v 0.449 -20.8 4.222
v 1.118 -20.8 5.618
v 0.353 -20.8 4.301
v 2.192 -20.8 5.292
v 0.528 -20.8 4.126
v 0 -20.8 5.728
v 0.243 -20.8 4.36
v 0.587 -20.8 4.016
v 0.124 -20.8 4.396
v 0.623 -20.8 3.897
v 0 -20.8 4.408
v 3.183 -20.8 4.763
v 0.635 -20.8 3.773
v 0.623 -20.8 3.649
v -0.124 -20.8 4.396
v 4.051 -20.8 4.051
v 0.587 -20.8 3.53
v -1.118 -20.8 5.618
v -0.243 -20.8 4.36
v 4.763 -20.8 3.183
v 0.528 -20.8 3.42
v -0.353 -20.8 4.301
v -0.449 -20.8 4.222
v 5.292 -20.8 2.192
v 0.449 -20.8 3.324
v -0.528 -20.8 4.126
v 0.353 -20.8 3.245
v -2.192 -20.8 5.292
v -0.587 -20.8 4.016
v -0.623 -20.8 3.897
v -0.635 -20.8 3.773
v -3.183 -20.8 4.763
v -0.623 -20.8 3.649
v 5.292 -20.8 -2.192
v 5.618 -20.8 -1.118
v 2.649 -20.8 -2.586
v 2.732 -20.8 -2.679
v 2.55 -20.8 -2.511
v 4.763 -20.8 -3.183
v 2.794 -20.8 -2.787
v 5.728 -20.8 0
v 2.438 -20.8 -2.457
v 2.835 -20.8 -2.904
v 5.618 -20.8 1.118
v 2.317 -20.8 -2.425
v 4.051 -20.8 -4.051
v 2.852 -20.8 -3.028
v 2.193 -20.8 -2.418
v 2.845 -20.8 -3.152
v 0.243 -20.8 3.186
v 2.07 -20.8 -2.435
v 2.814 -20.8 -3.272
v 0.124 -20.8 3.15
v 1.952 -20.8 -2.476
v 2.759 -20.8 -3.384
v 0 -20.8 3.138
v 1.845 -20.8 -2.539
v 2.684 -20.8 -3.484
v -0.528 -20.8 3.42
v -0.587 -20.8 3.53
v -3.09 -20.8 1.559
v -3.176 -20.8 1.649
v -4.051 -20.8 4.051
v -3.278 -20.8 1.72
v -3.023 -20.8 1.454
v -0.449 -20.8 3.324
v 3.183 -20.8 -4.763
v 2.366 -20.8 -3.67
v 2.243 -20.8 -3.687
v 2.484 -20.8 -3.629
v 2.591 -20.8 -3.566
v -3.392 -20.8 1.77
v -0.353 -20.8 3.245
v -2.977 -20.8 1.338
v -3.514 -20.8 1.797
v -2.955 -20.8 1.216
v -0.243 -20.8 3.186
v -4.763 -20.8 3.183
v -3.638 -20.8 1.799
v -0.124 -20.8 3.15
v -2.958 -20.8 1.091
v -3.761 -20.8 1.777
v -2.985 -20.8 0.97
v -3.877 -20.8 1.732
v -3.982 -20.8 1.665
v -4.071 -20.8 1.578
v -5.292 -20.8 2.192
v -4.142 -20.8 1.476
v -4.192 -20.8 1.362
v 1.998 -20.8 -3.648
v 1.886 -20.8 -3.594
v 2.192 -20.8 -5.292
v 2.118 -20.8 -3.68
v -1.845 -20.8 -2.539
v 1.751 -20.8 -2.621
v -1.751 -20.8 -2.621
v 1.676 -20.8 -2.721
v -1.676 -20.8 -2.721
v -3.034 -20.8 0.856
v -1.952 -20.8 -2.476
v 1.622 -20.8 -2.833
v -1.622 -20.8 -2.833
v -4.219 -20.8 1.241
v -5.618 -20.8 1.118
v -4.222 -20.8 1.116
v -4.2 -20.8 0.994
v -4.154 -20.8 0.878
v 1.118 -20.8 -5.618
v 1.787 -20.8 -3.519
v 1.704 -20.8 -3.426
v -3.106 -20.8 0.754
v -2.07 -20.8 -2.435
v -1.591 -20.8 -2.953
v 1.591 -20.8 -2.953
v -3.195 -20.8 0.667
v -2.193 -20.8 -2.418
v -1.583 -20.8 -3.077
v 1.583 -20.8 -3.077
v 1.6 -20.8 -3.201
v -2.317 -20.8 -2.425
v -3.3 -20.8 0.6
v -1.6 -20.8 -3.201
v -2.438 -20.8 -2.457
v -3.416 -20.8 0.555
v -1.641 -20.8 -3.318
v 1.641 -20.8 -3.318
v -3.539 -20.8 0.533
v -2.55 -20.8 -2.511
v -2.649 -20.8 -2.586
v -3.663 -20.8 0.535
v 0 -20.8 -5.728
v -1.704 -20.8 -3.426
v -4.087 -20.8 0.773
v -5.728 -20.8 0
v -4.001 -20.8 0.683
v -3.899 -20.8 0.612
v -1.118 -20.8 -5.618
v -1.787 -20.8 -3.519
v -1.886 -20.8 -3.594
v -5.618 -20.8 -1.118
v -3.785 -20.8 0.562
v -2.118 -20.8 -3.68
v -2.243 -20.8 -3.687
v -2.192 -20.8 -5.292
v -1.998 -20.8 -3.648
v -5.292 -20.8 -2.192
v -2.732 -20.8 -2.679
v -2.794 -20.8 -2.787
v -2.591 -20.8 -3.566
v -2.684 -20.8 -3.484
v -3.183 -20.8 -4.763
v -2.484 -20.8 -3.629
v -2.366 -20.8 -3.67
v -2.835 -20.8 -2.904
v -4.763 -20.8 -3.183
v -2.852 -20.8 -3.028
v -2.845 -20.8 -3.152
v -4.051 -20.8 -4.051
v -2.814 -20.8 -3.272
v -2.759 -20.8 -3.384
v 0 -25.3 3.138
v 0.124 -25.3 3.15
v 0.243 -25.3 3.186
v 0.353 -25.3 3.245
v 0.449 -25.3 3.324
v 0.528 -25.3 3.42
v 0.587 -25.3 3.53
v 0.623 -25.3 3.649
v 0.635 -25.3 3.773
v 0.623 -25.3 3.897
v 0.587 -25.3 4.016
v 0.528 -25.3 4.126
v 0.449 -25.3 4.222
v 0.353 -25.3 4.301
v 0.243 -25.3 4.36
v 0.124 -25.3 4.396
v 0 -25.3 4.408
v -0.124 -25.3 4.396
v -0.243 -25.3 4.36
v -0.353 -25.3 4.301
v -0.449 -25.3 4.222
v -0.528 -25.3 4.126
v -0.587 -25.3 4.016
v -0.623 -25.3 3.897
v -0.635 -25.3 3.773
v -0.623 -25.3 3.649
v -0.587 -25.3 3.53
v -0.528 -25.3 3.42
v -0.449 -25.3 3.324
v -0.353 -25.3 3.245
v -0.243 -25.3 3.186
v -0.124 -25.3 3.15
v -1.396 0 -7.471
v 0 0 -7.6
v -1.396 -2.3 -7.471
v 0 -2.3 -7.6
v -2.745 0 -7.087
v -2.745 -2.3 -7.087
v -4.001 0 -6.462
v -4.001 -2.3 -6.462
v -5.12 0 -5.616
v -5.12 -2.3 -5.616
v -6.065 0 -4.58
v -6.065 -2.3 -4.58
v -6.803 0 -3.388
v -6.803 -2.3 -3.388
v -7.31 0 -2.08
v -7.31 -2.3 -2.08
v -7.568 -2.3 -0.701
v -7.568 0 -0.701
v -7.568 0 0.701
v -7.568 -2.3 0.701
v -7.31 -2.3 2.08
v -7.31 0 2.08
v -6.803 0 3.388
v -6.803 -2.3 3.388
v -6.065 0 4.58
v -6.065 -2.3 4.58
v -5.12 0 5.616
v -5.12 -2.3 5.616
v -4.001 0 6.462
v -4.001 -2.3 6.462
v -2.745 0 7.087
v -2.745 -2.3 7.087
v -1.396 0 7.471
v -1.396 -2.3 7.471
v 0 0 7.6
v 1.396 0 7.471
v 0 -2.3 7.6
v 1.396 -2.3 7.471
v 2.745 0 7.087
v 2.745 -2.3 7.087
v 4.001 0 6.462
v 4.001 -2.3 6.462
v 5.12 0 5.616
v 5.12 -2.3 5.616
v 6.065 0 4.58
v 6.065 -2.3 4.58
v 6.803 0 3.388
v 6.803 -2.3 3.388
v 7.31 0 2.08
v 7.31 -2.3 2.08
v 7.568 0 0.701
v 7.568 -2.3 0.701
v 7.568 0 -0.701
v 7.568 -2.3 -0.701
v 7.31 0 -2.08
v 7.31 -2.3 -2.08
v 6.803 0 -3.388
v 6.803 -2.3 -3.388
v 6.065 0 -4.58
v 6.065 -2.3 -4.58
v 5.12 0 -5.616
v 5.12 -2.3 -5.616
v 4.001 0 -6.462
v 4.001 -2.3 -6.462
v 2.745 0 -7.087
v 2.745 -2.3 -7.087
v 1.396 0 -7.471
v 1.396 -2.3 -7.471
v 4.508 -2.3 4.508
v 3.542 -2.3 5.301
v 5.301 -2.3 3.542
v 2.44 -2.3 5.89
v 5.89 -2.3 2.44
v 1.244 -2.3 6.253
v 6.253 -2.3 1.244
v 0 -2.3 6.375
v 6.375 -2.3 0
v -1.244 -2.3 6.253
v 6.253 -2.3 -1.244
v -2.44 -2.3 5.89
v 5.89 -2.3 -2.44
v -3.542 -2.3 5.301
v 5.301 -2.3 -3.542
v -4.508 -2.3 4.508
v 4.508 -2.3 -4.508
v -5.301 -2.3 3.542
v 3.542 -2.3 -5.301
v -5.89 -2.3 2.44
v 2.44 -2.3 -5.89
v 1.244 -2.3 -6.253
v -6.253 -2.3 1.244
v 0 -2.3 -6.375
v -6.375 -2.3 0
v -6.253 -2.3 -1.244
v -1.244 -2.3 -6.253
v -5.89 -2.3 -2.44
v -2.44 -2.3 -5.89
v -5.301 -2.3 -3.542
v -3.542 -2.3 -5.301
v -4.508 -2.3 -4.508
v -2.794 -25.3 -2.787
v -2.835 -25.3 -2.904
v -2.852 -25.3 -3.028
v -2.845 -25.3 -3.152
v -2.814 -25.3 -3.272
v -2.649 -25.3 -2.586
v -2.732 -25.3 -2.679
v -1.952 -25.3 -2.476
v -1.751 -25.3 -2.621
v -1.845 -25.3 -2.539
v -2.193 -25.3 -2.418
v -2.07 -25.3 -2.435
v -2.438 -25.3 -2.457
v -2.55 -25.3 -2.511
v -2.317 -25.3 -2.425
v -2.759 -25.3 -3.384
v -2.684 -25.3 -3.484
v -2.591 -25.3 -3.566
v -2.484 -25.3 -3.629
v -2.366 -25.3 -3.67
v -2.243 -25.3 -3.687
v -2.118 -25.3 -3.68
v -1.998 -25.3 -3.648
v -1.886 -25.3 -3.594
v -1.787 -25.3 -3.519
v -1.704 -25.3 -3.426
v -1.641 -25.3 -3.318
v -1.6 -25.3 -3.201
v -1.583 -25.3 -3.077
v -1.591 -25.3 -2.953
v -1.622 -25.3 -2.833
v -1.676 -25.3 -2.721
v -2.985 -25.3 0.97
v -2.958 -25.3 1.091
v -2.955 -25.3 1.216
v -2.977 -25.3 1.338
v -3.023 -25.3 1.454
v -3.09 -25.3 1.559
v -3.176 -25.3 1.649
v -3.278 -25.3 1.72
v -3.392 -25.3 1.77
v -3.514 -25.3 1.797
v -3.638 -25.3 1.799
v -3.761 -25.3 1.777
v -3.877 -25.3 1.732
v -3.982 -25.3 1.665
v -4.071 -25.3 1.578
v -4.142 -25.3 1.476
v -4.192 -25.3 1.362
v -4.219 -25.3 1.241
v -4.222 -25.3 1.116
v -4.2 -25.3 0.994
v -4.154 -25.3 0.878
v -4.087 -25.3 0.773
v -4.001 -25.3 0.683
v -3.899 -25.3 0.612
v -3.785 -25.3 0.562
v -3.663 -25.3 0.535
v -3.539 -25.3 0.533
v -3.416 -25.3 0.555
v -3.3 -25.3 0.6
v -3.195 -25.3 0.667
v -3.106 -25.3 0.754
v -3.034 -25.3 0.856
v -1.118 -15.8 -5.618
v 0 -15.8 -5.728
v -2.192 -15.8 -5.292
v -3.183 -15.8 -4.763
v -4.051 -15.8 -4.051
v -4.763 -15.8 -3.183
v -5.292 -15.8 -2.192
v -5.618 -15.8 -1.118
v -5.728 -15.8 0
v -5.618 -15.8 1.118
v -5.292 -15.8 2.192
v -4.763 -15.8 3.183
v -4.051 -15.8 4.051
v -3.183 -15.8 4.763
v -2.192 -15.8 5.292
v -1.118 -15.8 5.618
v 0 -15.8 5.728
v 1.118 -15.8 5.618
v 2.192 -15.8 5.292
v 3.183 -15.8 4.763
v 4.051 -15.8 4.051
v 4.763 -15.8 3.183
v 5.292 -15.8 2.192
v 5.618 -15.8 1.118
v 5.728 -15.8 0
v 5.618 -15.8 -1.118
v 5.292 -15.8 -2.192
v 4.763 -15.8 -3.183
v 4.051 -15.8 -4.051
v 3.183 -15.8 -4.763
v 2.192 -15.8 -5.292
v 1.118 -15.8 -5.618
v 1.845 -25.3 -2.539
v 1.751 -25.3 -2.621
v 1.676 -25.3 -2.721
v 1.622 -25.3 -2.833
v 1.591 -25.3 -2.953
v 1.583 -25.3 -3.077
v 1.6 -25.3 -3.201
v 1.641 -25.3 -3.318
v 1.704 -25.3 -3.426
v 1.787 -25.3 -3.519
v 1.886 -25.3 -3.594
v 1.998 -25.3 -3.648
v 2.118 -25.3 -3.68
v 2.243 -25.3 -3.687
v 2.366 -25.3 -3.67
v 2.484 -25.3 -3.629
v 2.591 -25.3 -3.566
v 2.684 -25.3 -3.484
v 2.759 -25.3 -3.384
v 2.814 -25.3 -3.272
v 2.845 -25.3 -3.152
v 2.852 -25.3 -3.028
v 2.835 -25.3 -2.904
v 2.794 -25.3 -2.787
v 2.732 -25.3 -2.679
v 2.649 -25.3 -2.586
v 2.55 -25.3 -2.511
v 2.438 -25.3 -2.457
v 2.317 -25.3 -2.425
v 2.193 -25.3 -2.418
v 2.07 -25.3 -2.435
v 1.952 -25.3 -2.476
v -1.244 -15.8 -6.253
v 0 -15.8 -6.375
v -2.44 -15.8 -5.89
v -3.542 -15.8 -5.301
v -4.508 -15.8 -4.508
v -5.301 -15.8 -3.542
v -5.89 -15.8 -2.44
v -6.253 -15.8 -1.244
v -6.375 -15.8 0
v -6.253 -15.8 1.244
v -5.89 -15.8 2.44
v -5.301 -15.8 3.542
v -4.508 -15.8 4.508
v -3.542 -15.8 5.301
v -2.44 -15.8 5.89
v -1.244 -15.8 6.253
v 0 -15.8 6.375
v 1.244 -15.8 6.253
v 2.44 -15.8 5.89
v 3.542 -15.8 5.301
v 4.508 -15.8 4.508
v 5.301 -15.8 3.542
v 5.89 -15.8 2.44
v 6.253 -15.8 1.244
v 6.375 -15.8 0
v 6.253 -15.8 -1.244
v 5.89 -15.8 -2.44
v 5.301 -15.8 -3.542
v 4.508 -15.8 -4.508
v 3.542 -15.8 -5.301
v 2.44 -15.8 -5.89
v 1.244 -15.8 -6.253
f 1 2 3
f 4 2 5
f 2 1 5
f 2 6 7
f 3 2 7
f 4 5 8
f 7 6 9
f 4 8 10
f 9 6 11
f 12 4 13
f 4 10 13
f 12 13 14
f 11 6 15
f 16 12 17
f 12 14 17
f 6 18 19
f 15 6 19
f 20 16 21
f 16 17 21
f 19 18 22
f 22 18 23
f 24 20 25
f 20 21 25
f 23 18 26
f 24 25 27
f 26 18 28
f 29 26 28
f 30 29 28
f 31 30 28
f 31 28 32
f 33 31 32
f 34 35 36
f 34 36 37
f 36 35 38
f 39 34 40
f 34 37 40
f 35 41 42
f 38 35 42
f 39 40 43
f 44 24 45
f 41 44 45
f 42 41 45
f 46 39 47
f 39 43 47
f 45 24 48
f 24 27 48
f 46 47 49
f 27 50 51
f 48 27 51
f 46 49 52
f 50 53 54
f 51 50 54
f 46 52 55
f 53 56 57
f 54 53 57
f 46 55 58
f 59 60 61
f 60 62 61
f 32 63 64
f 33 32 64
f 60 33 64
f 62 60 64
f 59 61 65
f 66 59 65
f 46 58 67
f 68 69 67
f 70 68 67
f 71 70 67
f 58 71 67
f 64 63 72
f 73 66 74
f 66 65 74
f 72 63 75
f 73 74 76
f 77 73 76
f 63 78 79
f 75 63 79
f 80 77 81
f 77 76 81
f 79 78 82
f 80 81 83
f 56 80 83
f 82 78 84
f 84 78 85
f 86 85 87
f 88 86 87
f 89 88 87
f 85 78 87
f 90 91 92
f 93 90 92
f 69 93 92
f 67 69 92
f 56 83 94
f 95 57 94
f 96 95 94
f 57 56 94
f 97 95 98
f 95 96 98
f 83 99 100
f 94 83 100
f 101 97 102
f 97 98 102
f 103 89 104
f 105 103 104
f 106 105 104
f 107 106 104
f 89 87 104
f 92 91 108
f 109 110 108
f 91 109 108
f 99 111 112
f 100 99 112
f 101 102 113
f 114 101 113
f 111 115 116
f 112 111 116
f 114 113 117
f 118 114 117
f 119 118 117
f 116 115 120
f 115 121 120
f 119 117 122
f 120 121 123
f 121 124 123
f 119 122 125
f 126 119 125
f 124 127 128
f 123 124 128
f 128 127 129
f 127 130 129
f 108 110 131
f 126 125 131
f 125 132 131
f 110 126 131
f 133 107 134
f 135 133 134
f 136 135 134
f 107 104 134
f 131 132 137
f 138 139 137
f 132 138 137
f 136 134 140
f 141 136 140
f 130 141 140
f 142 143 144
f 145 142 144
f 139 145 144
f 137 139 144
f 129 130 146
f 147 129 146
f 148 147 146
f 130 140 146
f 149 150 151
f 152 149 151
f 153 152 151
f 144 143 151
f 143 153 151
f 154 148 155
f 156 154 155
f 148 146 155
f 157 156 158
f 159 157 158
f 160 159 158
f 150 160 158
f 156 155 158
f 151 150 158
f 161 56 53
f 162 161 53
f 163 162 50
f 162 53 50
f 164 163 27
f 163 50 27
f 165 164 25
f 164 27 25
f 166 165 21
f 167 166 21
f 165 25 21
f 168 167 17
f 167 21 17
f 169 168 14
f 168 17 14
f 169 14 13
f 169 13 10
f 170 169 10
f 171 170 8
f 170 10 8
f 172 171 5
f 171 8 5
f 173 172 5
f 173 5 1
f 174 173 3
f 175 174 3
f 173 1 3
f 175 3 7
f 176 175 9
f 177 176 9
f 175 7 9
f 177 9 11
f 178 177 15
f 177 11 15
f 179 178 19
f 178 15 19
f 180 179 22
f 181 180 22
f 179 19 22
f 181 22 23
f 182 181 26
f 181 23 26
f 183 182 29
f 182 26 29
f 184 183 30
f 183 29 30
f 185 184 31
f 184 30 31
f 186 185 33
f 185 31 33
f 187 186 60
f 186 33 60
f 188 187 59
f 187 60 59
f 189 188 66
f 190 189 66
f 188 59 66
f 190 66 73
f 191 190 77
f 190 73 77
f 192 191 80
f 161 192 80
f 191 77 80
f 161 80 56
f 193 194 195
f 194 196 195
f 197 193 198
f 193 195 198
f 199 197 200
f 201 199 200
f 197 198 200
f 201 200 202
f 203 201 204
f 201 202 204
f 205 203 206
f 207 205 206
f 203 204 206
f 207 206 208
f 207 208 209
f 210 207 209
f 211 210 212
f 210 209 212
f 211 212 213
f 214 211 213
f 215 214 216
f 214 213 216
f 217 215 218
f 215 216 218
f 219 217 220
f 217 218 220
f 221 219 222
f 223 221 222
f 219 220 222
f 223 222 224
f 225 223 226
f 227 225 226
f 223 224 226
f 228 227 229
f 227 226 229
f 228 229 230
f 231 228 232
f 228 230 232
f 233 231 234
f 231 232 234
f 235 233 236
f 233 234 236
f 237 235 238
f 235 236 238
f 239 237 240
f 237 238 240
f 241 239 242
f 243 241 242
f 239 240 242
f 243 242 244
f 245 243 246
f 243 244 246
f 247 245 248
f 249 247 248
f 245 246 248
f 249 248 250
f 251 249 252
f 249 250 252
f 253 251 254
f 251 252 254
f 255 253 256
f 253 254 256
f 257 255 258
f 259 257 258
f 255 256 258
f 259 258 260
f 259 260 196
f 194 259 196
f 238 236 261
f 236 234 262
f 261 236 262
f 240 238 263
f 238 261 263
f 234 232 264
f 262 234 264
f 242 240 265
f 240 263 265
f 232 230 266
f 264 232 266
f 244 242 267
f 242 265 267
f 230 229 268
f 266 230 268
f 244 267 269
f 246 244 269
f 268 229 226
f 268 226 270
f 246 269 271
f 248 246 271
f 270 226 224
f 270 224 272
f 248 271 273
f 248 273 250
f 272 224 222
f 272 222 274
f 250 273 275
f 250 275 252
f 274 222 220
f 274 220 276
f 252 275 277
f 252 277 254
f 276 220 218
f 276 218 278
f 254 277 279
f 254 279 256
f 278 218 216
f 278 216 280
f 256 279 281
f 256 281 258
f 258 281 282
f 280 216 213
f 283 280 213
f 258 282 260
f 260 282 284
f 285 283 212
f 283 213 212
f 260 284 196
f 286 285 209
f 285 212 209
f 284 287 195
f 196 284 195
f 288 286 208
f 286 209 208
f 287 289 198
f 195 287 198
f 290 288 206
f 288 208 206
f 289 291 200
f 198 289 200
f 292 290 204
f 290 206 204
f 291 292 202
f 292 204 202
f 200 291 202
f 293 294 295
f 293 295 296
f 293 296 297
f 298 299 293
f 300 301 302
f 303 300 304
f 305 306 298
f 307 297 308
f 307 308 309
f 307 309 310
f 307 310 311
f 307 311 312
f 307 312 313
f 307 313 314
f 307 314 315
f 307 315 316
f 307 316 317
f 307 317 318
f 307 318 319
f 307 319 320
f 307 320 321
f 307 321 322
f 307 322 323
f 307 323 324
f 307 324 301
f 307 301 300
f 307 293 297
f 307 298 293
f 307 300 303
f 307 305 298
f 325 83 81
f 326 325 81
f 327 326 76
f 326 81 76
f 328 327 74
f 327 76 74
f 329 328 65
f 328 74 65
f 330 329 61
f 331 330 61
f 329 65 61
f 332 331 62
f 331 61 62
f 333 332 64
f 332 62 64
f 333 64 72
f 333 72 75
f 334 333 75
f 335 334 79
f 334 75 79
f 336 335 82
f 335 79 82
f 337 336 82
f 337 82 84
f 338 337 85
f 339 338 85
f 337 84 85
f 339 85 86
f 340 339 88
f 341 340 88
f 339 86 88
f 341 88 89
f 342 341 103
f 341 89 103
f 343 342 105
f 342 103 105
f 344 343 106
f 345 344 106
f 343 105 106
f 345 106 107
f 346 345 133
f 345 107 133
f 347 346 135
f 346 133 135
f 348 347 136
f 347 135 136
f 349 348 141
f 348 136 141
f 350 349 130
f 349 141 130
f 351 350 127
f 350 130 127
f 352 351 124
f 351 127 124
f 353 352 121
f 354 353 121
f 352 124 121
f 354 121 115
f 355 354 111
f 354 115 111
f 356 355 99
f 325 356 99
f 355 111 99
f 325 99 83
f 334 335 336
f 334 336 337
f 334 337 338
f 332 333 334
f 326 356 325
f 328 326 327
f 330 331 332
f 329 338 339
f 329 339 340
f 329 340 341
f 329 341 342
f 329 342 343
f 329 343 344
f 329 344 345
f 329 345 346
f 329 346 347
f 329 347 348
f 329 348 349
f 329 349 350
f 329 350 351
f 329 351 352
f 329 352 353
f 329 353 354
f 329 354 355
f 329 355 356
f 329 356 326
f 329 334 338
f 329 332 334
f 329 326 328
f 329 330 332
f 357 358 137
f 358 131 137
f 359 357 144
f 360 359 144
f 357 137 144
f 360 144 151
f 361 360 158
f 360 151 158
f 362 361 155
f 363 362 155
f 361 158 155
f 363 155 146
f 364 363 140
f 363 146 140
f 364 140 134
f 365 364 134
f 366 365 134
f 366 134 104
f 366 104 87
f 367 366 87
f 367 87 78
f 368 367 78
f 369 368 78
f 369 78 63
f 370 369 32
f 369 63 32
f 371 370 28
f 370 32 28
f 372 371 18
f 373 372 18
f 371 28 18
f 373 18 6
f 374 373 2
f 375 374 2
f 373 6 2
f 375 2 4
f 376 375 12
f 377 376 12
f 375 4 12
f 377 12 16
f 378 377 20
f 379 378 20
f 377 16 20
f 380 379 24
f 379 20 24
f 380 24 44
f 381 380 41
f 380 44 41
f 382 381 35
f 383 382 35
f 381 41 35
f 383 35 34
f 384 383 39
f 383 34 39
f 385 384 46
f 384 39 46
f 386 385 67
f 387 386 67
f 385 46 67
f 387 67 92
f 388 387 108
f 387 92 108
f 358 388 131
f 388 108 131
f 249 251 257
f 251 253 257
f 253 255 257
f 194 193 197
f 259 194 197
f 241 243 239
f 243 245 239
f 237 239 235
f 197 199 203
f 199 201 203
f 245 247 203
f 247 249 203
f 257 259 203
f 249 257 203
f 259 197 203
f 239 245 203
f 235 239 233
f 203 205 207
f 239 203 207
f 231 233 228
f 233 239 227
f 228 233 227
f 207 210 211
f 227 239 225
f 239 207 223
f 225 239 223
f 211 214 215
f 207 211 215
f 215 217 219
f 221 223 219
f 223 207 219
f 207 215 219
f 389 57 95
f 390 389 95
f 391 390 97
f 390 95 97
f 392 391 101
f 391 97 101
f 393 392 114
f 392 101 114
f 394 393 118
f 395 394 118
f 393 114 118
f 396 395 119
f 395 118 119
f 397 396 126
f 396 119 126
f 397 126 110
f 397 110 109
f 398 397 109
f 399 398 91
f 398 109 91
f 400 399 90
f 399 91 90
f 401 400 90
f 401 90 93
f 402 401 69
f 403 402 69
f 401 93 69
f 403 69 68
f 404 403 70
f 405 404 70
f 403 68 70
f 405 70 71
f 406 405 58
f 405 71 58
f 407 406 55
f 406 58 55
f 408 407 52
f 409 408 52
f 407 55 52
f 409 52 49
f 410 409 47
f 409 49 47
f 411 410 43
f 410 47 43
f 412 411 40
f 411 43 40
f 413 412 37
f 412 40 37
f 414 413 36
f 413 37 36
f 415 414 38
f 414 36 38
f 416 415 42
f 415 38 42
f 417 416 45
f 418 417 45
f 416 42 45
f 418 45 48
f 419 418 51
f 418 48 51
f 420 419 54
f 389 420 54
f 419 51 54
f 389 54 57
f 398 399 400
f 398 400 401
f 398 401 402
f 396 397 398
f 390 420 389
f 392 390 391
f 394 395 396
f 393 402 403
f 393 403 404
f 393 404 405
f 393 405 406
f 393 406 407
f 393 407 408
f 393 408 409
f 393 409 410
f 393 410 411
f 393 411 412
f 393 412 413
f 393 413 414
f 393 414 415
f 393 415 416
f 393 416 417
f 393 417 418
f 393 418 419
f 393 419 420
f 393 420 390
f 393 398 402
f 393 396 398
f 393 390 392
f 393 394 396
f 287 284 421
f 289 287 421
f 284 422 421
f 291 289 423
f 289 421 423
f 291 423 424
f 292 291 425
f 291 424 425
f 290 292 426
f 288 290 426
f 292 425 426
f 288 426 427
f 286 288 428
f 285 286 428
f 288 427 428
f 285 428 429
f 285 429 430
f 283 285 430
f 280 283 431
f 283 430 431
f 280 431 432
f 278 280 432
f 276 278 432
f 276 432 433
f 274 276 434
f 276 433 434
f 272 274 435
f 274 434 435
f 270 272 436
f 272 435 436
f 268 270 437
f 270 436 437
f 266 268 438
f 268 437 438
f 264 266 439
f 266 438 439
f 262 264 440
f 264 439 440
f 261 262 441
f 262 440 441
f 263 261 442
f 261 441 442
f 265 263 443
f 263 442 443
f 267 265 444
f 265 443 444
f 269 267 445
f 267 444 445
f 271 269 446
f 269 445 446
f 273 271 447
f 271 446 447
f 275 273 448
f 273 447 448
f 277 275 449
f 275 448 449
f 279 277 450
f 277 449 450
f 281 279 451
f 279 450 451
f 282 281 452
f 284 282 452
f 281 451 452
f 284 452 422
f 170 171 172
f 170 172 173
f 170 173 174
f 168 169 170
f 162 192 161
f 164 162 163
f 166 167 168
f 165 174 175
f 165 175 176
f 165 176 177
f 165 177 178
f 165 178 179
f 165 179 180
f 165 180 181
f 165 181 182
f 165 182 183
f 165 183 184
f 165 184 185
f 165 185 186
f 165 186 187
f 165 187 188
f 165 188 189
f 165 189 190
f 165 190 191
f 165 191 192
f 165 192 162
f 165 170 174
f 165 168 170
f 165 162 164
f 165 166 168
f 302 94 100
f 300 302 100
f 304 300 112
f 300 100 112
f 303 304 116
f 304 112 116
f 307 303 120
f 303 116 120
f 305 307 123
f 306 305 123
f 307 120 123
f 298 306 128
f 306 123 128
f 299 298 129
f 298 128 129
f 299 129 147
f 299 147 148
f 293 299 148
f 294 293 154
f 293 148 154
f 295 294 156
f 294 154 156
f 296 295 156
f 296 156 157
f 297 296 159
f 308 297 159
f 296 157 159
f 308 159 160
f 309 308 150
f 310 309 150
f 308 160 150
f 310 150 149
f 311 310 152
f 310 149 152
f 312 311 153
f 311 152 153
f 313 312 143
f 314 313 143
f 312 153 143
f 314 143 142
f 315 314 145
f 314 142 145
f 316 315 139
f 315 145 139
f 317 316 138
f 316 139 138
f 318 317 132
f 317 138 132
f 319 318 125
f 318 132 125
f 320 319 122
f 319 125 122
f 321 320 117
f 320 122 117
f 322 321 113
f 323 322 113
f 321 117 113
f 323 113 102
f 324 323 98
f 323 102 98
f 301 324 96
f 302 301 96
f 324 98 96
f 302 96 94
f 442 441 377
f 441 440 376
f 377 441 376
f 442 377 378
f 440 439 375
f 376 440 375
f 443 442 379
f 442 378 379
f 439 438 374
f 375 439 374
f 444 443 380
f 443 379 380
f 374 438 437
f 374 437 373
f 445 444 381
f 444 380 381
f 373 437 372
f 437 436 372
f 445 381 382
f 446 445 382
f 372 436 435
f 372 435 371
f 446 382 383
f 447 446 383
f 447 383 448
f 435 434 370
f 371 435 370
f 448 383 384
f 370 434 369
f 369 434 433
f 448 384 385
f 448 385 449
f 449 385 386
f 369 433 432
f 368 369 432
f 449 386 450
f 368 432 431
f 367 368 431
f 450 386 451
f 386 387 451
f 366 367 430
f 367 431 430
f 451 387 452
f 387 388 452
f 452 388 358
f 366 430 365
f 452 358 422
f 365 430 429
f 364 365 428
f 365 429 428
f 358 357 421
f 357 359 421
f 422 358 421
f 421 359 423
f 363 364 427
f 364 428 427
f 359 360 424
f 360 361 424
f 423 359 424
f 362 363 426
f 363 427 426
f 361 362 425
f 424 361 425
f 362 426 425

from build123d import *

# Parameters (mm, degrees)
SKETCH2_R           = 0.635
BOSS_EXTRUDE1_DEPTH = 4.5
CIRPATTERN1_COUNT   = 4
CIRPATTERN1_ANGLE   = 216


with BuildPart() as part:
    # Sketch1 → Revolve1 (revolve)
    with BuildSketch(Plane.XY, mode=Mode.PRIVATE) as revolve1_sk:
        Polygon((0, 0), (7.6, 0), (7.6, -2.3), (6.375, -2.3), (6.375, -15.8), (5.728350463, -15.8), (5.728350463, -20.8), (0, -20.8), align=None)
    revolve(revolve1_sk.sketch.rotate(Axis((0, -20.8, 0), (0, 1, 0)), 90), axis=Axis((0, -20.8, 0), (0, 1, 0)))

    # Sketch2 → Boss-Extrude1 (add)
    with BuildSketch(Plane.XZ.offset(20.8)):
        with Locations(Location((0, 3.773128742, 0), (0, 0, 270))):
            Circle(SKETCH2_R)
    boss_extrude1 = extrude(amount=BOSS_EXTRUDE1_DEPTH)

    # CirPattern1: Boss-Extrude1 ×4 about axis
    cirpattern1_axis = Axis((0, 0, 0), (0, -1, 0))
    for i in range(1, CIRPATTERN1_COUNT):
        add(boss_extrude1.rotate(cirpattern1_axis, i * CIRPATTERN1_ANGLE / (CIRPATTERN1_COUNT - 1)))


solid = part.part
